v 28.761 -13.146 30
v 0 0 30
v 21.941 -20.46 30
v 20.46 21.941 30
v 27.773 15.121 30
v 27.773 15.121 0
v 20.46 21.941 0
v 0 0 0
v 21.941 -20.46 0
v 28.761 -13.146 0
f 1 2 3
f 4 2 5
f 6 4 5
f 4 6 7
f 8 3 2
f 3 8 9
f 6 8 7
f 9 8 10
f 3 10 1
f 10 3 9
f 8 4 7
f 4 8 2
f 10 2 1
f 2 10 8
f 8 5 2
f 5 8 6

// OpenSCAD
rotate([0,0,-88])
rotate([0,-90,0]){
    difference(){
        rotate([-45,0,0]) {
            cube([30, 30, 30]);
        }
        scale([1,2,1]) {
            rotate([-45,0,0]) {
                cube([30, 30, 30]);
            }
        }
    }
}
